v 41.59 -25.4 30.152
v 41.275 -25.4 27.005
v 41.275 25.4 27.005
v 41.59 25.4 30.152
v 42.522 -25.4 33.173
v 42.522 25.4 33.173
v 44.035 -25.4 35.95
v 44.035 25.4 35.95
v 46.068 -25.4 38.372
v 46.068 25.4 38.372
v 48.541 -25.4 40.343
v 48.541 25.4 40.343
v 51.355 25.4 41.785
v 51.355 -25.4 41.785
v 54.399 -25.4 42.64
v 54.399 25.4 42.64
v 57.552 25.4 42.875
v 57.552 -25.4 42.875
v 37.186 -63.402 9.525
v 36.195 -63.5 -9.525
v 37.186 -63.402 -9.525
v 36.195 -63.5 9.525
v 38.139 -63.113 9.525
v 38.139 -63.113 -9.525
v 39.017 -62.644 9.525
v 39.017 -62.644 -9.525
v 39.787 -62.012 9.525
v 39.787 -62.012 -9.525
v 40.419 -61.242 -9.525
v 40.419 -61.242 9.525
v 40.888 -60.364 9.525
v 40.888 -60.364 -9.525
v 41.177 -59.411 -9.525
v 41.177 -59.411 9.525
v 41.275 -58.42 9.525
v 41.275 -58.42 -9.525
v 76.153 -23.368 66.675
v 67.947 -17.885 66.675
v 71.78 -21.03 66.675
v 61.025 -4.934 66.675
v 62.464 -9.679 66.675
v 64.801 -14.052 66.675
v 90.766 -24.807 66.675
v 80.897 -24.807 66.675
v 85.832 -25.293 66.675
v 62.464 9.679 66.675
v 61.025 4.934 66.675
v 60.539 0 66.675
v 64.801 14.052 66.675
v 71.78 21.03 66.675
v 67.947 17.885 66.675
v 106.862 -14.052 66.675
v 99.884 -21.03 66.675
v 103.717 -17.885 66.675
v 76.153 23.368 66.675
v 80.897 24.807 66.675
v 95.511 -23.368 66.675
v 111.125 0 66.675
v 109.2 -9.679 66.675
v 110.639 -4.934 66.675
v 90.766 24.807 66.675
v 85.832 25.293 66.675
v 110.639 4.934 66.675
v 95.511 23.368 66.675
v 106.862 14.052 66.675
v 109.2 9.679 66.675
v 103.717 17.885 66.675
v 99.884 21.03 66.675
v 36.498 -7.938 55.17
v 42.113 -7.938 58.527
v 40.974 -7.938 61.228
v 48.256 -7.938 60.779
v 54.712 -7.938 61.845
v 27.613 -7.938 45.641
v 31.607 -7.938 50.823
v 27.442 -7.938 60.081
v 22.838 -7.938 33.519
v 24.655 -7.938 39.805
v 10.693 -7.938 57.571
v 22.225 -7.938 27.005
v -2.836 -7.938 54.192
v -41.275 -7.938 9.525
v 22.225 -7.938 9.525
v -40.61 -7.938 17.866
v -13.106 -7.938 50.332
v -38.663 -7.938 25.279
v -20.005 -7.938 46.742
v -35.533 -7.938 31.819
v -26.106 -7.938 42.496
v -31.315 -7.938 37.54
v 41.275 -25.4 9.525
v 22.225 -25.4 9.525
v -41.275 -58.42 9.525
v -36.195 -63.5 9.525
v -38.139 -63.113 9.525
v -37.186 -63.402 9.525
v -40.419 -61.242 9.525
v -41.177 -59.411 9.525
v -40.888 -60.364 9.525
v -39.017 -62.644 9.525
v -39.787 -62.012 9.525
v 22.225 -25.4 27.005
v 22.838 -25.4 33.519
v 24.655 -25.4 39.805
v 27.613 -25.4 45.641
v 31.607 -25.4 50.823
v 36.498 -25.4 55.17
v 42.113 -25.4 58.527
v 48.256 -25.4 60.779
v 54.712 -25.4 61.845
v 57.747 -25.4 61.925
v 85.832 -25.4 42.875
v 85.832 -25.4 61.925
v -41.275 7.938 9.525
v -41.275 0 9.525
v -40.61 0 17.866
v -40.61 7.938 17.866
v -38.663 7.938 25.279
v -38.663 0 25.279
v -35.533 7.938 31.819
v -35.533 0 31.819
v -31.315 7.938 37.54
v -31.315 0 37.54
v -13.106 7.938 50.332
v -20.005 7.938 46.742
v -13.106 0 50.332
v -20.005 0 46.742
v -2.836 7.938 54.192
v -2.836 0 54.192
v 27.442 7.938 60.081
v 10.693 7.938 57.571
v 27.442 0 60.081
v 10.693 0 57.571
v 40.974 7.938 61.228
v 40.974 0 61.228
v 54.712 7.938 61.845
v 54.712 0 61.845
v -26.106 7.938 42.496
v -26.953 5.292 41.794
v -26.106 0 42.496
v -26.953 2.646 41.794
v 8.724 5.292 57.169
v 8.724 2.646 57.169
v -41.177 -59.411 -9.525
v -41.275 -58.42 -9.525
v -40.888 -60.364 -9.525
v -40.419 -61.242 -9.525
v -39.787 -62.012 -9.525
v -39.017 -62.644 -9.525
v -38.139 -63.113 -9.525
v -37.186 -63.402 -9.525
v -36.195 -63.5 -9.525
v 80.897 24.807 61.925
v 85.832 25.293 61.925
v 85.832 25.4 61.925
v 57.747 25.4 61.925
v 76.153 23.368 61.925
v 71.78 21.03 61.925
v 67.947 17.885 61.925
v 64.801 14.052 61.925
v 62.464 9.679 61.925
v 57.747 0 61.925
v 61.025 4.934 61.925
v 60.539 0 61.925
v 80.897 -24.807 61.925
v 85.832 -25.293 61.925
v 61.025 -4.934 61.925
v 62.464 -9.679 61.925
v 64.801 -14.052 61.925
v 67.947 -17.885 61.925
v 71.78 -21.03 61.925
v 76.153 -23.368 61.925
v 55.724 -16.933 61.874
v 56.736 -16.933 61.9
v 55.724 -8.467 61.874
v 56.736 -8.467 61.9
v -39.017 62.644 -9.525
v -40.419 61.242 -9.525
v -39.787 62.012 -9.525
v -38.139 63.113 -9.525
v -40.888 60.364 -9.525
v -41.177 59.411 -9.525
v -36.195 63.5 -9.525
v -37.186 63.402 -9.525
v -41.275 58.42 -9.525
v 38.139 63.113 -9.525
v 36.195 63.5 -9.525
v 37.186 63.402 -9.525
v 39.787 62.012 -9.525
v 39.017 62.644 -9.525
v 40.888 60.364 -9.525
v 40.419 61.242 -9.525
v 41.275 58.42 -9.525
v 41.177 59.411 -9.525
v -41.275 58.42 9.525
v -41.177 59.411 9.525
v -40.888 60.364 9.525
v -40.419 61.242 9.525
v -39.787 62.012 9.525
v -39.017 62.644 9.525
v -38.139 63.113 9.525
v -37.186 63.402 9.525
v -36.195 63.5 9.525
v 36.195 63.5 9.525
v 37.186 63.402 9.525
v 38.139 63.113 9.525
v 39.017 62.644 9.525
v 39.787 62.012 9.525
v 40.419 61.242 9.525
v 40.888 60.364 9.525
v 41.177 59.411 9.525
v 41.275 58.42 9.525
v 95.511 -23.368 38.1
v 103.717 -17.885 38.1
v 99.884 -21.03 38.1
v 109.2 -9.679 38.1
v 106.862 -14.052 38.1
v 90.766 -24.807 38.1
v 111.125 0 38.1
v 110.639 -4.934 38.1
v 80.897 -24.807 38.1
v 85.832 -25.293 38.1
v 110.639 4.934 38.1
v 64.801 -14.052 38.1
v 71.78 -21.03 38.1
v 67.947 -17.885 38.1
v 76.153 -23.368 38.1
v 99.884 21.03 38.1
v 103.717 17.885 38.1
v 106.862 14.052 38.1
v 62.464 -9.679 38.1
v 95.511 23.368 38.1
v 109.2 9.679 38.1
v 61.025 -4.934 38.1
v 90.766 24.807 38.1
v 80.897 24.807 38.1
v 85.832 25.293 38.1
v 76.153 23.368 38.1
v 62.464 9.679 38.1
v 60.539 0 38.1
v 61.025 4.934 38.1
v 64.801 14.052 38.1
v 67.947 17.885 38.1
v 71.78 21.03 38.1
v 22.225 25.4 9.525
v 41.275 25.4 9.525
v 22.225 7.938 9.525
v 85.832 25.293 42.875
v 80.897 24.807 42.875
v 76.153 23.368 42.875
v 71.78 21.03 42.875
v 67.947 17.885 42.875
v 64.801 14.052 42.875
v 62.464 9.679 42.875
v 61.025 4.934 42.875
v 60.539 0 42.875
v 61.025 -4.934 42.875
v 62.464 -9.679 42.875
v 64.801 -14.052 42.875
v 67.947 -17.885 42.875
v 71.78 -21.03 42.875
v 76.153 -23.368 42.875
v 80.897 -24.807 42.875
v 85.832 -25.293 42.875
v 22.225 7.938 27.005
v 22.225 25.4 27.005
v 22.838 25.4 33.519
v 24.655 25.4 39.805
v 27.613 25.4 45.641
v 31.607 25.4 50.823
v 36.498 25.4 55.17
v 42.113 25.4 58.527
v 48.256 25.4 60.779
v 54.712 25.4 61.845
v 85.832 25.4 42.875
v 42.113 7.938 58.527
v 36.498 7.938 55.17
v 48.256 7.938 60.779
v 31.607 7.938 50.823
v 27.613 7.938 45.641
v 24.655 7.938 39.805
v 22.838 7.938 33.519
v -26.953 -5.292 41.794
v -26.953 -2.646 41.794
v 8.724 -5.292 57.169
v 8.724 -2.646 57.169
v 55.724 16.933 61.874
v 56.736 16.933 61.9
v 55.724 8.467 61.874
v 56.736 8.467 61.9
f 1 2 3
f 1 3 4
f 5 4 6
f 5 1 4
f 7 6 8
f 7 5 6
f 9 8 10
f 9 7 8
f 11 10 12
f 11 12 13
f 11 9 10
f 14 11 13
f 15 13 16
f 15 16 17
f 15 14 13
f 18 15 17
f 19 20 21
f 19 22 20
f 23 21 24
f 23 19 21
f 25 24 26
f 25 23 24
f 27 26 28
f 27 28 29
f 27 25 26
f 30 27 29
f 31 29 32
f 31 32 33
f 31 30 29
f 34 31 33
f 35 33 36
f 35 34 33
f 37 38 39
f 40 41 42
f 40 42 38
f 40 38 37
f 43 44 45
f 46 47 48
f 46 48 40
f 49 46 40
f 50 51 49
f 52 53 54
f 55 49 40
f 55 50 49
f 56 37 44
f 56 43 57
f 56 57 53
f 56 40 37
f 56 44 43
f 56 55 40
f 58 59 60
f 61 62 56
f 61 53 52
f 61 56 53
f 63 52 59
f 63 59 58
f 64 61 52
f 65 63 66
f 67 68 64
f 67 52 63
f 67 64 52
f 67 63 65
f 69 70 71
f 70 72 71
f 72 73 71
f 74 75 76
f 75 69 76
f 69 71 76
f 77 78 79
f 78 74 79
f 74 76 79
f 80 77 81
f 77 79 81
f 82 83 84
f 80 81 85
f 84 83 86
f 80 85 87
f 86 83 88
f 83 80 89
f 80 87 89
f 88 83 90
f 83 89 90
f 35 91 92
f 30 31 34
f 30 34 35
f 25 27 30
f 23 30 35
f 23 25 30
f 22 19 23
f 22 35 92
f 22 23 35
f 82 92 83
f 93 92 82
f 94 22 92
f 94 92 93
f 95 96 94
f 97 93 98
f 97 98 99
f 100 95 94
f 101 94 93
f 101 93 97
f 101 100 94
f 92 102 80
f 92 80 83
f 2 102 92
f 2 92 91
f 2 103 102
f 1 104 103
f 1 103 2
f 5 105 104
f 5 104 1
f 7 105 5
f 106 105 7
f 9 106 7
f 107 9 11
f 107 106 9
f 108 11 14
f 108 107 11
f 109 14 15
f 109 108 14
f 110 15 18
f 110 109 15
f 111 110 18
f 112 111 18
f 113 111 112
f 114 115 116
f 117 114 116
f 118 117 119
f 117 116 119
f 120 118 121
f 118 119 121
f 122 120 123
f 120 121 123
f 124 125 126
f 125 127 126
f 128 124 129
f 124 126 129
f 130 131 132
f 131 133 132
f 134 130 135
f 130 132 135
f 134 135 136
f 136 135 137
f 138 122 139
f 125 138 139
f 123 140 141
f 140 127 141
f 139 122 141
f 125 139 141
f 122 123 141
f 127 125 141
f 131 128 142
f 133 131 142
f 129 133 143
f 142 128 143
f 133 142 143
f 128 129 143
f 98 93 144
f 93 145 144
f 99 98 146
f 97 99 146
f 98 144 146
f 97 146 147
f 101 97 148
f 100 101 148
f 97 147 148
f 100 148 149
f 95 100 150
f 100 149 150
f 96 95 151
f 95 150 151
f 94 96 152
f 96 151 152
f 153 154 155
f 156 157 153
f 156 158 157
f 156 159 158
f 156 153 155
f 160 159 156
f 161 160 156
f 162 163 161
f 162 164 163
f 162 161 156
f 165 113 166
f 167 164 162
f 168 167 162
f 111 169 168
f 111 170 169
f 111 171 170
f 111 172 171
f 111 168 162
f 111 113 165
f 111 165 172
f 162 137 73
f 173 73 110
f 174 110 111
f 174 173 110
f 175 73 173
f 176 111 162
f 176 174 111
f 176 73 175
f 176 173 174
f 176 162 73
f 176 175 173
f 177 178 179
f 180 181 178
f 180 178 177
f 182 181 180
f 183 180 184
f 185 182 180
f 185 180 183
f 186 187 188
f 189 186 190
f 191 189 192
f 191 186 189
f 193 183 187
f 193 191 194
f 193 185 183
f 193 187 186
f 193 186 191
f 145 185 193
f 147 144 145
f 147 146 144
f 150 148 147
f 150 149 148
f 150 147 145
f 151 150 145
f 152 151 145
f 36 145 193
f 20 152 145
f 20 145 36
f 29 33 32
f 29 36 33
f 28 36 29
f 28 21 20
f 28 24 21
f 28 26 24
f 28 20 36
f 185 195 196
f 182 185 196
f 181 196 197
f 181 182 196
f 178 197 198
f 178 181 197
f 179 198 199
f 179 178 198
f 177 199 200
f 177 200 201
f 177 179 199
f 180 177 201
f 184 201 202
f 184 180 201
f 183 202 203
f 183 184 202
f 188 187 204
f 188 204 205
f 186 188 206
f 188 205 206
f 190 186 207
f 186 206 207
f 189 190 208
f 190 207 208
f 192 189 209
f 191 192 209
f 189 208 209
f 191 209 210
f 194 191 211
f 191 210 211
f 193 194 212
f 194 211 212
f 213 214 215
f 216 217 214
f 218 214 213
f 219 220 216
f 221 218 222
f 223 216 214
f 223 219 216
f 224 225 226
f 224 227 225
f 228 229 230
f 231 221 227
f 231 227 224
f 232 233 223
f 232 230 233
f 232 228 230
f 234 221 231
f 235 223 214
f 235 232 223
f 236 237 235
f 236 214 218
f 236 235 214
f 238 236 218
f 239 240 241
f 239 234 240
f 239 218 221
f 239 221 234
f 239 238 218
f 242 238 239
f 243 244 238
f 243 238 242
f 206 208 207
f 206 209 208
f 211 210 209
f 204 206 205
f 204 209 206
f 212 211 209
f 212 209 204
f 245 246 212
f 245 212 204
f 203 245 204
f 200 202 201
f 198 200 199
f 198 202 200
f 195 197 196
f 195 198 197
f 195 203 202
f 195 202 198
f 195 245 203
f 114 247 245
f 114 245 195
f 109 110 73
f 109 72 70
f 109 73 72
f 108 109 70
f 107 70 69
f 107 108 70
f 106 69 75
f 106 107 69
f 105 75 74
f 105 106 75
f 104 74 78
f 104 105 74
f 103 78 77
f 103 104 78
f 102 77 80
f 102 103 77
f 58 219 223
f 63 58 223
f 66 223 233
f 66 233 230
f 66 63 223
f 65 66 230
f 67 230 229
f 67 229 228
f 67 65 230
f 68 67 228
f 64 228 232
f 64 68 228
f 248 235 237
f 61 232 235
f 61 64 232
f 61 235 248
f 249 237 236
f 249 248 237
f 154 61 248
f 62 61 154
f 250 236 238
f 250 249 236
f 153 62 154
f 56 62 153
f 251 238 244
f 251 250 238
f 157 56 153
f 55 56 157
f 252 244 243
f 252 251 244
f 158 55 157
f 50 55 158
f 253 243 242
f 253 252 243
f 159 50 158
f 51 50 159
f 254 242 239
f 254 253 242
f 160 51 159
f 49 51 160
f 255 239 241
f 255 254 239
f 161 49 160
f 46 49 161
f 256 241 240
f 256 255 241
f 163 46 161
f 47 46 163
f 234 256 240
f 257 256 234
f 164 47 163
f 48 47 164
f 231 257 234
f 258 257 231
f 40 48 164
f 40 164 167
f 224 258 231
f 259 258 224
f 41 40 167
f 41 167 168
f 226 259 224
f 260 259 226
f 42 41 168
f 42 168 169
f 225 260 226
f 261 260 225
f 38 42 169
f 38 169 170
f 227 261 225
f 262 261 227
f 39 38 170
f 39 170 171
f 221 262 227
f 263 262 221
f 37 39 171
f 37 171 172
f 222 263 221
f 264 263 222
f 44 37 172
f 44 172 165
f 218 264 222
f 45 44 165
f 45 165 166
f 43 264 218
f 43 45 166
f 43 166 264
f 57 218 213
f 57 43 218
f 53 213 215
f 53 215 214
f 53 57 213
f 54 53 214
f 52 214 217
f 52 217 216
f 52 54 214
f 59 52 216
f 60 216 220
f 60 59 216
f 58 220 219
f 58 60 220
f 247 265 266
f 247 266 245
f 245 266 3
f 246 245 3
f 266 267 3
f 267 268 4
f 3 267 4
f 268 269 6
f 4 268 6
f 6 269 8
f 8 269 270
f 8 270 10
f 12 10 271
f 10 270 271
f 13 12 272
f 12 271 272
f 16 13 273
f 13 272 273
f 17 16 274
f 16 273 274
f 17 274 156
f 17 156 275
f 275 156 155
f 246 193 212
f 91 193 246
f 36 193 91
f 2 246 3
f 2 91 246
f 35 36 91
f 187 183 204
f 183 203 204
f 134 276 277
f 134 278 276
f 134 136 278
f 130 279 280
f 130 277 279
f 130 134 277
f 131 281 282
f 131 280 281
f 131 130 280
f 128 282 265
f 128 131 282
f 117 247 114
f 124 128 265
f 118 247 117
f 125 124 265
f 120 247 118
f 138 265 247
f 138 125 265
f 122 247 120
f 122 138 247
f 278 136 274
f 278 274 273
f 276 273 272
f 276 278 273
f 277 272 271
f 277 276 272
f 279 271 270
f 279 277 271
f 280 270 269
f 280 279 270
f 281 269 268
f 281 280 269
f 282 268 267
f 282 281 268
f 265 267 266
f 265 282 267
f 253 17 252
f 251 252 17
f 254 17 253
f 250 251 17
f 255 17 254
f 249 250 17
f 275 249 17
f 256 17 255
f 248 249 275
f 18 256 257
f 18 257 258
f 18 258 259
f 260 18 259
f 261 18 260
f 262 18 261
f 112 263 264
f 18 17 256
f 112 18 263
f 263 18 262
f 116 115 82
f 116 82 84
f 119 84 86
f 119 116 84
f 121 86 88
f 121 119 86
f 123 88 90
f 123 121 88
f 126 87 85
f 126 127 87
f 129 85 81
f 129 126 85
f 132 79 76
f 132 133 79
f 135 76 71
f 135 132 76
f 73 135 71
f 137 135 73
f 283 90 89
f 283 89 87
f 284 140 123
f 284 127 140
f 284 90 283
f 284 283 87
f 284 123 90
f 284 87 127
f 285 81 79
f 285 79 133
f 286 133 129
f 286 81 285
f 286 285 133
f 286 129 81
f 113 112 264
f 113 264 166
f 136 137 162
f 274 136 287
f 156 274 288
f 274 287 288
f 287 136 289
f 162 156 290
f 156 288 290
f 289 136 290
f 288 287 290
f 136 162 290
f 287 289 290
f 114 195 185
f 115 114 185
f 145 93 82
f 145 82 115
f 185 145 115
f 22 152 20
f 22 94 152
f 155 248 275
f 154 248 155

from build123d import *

# Parameters (mm, degrees)
F1_DEPTH = 63.5
F0_W     = 25.5068594253
F0_H     = 19.05
F2_DEPTH = 25.4
F4_DEPTH = 7.9375
F5_R     = 5.08


with BuildPart() as f1:
    # F0 (on Front) → F1 (new body, symmetric)
    with BuildSketch(Plane.XZ):
        Polygon((22.225, 9.525), (-41.275, 9.525), (-41.275, -9.525), (41.275, -9.525), (41.275, 9.525), align=None)
    extrude(amount=F1_DEPTH, both=True)

    # F0 (on Front) → F2 (join, symmetric)
    with BuildSketch(Plane.XZ):
        with BuildLine():
            Line((22.225, 27.0052991994), (22.225, 9.525))
            Line((22.225, 9.525), (41.275, 9.525))
            Line((41.275, 9.525), (41.275, 27.0052991994))
            ThreePointArc((41.275, 27.0052991994), (46.0678396882, 38.3719762786), (57.5523351588, 42.8752))
            Line((57.5523351588, 42.8752), (60.325, 42.8752))
            Line((60.325, 42.8752), (60.325, 61.9252))
            Line((60.325, 61.9252), (57.7467856216, 61.9252))
            add(Edge.make_bspline(
                [(54.7118794678, 61.8450924432), (55.7241751025, 61.874777301), (56.735971204, 61.9013896481), (57.7467856217, 61.9252)],
                knots=[109.6921191668, 109.6921191668, 109.6921191668, 109.6921191668, 112.0316695749, 112.0316695749, 112.0316695749, 112.0316695749], degree=3))
            ThreePointArc((54.7118794678, 61.8450924432), (31.6068308095, 50.8234043446), (22.225, 27.0052991994))
        make_face()
        with Locations((73.0784297127, 52.4002)):
            Rectangle(F0_W, F0_H)
    extrude(amount=F2_DEPTH, both=True)

    # F0 (on Front) → F3 (revolve)
    with BuildSketch(Plane.XZ):
        Polygon((85.8318594253, 66.675), (85.8318594253, 61.9252), (85.8318594253, 42.8752), (85.8318594253, 38.1), (111.125, 38.1), (111.125, 66.675), align=None)
    revolve(axis=Axis((85.8318594253, 0, 52.3875), (0, 0, 1)))

    # F0 (on Front) → F4 (join, symmetric)
    with BuildSketch(Plane.XZ):
        with BuildLine():
            add(Edge.make_bspline(
                [(-41.275, 9.525), (-41.3111924675, 52.3071991607), (7.2494041966, 60.4532887264), (54.7118794678, 61.8450924432)],
                knots=[0, 0, 0, 0, 109.6921191668, 109.6921191668, 109.6921191668, 109.6921191668], degree=3))
            Line((-41.275, 9.525), (22.225, 9.525))
            Line((22.225, 9.525), (22.225, 27.0052991994))
            ThreePointArc((22.225, 27.0052991994), (31.6068308095, 50.8234043446), (54.7118794678, 61.8450924432))
        make_face()
    extrude(amount=F4_DEPTH, both=True)

    # F5
    f5_edges = [f1.edges().sort_by_distance(p)[0] for p in [
        (-41.275, -63.5, 0),
        (41.275, -63.5, 0),
        (41.275, 63.5, 0),
        (-41.275, 63.5, 0),
    ]]
    fillet(f5_edges, radius=F5_R)


solid = f1.part
